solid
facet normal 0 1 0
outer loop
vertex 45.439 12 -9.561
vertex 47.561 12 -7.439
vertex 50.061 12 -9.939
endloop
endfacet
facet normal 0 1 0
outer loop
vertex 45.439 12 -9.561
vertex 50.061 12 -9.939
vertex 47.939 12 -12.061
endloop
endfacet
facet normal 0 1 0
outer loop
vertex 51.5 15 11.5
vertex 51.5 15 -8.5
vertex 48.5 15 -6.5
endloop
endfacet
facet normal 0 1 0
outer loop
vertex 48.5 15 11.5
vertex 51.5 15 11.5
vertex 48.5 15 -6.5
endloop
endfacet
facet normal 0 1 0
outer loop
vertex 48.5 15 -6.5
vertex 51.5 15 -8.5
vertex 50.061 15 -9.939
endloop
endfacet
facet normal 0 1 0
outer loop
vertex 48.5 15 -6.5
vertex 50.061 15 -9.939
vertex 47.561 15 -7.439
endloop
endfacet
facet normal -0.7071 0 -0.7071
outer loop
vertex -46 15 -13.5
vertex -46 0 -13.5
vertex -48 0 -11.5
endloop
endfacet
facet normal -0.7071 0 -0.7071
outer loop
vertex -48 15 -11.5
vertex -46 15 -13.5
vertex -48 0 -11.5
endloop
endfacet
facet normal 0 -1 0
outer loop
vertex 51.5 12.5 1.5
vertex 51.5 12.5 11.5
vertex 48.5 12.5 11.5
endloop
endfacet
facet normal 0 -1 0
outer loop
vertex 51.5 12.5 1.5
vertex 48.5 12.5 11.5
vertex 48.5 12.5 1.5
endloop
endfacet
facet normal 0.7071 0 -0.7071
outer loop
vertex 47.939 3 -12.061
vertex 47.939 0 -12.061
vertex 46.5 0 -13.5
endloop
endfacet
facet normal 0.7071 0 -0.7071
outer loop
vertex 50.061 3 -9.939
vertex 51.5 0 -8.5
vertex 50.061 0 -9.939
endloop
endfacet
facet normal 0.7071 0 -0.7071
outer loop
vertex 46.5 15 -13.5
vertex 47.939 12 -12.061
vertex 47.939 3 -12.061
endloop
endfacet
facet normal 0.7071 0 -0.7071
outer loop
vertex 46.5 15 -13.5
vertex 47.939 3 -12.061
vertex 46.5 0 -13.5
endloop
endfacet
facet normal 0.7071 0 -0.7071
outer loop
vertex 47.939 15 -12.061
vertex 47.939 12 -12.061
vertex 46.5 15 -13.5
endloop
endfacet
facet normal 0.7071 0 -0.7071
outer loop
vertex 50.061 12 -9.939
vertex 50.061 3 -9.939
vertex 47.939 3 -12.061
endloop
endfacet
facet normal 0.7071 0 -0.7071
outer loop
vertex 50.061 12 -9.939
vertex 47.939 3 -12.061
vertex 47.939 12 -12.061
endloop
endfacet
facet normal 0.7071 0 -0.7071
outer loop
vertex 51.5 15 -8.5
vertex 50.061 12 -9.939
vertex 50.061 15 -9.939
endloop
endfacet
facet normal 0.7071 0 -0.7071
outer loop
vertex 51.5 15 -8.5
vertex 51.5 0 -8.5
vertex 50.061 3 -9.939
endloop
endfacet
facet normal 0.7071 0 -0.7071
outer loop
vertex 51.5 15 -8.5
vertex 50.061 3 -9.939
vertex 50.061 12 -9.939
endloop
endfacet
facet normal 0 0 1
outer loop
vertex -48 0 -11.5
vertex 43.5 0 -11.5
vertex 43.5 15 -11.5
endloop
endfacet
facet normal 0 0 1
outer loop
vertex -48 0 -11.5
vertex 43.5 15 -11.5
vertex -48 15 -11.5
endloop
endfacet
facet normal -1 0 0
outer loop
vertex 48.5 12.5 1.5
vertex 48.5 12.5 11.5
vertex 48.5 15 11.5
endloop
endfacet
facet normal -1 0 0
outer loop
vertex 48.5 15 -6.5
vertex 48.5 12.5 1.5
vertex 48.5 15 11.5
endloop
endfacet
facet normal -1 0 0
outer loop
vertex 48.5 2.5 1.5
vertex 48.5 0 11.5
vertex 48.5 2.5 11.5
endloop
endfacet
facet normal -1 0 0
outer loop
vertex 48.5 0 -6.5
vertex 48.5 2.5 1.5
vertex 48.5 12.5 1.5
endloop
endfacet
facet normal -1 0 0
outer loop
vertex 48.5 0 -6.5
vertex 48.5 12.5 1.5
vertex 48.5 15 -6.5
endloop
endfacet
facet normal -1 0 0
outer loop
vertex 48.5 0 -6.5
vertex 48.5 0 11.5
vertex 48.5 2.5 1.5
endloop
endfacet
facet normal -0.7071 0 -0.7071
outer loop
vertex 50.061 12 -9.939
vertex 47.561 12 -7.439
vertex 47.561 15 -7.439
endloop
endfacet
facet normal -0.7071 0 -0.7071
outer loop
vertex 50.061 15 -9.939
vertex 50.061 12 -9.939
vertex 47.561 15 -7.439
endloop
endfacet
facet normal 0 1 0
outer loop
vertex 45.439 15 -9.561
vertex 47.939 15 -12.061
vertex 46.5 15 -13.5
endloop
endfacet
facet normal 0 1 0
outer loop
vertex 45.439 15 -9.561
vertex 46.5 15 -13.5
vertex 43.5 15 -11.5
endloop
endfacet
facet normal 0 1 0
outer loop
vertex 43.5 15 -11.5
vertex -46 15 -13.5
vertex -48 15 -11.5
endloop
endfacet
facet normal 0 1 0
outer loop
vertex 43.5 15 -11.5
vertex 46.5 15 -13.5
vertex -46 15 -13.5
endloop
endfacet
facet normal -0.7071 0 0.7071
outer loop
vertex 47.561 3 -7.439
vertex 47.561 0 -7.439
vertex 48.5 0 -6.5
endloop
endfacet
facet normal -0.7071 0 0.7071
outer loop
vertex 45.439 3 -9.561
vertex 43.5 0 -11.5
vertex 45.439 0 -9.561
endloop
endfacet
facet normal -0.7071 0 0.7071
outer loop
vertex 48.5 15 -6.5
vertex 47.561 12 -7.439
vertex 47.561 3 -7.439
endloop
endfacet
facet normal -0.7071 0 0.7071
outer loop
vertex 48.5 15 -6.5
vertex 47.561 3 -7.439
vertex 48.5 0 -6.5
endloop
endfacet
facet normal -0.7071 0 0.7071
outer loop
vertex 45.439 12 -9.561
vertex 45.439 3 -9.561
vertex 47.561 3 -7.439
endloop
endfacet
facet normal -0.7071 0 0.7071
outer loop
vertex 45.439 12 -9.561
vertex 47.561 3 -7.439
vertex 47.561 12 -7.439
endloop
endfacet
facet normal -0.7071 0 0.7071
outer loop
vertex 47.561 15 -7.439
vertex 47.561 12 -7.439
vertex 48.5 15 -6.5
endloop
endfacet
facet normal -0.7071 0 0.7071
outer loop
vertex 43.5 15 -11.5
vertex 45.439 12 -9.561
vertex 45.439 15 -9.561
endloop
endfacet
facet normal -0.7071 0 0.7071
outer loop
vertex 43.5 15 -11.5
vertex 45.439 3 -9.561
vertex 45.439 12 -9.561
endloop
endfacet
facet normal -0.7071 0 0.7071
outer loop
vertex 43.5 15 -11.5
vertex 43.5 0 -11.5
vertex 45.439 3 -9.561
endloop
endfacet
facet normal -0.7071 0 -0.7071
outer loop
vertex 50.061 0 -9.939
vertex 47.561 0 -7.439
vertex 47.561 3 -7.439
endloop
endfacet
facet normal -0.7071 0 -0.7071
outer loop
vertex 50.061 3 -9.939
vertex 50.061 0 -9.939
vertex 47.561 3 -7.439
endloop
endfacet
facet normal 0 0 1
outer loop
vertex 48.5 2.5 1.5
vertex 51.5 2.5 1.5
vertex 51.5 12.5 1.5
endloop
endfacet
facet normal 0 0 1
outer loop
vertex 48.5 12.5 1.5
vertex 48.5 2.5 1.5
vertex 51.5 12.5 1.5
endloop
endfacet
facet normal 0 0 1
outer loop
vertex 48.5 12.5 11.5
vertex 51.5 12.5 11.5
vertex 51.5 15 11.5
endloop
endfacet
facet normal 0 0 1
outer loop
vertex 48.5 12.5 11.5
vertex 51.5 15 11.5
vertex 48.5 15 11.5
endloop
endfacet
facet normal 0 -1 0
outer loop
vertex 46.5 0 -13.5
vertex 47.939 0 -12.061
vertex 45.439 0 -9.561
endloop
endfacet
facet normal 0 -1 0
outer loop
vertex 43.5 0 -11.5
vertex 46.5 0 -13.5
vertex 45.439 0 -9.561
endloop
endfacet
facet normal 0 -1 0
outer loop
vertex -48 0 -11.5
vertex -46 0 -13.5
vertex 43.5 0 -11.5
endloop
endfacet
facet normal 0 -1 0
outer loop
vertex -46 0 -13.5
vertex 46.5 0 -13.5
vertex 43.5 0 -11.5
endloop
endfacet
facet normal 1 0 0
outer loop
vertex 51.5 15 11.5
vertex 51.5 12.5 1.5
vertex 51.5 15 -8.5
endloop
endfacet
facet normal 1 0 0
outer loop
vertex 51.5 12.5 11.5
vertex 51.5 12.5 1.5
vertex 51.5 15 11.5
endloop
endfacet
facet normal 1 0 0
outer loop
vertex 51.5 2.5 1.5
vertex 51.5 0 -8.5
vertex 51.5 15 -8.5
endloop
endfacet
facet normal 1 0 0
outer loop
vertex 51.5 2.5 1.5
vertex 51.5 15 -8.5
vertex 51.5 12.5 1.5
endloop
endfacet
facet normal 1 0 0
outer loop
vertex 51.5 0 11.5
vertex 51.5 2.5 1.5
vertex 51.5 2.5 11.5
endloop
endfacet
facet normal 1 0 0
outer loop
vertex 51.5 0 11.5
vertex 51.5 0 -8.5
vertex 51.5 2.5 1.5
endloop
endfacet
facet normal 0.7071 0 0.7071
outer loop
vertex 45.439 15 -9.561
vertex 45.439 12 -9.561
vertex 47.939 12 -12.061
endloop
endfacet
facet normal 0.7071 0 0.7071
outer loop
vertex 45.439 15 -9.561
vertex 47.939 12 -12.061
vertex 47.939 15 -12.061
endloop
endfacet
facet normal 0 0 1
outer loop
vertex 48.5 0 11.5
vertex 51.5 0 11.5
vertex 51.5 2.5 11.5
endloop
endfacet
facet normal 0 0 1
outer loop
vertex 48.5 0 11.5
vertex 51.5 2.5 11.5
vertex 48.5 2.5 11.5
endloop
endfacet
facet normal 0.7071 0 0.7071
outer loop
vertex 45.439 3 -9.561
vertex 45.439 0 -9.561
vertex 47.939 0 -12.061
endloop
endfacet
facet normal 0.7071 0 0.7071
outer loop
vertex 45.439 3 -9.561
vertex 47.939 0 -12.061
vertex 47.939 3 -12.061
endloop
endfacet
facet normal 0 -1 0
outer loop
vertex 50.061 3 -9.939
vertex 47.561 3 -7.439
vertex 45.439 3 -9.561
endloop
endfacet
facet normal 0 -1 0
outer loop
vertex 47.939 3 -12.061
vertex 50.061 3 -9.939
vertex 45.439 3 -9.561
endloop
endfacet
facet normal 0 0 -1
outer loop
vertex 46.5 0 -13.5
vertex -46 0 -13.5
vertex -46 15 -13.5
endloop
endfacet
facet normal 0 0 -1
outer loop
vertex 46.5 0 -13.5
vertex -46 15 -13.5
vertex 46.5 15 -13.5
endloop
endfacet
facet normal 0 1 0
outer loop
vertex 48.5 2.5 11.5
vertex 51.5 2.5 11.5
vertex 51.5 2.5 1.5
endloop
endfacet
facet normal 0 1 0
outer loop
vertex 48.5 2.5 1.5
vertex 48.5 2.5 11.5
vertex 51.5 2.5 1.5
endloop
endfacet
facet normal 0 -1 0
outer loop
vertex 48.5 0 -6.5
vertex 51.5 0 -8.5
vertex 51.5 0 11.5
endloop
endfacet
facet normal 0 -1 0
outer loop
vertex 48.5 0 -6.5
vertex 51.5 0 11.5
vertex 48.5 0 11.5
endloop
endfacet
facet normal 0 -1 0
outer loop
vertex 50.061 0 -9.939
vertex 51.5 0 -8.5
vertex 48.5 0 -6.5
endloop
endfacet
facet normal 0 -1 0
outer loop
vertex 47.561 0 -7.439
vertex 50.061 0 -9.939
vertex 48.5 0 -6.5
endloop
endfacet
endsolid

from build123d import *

# Parameters (mm, degrees)
BOSS_EXTRUDE1_DEPTH = 15
CHAMFER1_SIZE       = 5
SKETCH3_W           = 10
SKETCH3_H           = 10
CUT_EXTRUDE1_DEPTH  = 24
CHAMFER2_SIZE       = 2.5
SKETCH4_W           = 3
SKETCH4_H           = 3
CUT_EXTRUDE2_DEPTH  = 3.535533906


with BuildPart() as part:
    # Sketch1 → Boss-Extrude1 (new body)
    with BuildSketch(Plane(origin=(0, 0, 0), x_dir=(1, 0, 0), z_dir=(0, 1, 0))):
        Polygon((-48.5, 13.5), (51.5, 13.5), (51.5, -11.5), (48.5, -11.5), (48.5, 11.5), (-48.5, 11.5), align=None)
    extrude(amount=BOSS_EXTRUDE1_DEPTH)

    # Chamfer1
    chamfer1_edges = [part.edges().sort_by_distance(p)[0] for p in [
        (51.5, 7.5, -13.5),
        (48.5, 7.5, -11.5),
    ]]
    chamfer(chamfer1_edges, length=CHAMFER1_SIZE)

    # Sketch3 → Cut-Extrude1 (cut)
    with BuildSketch(Plane(origin=(51.5, 0, 0), x_dir=(0, 0, -1), z_dir=(1, 0, 0))):
        with Locations((-6.5, 7.5)):
            Rectangle(SKETCH3_W, SKETCH3_H)
    extrude(amount=-CUT_EXTRUDE1_DEPTH, mode=Mode.SUBTRACT)

    # Chamfer2
    # the kernel refuses this chamfer: 2.5 mm, written as the material it takes off along each edge
    with BuildSketch(Plane(origin=(-48.5, -6.42920747, -13.5), x_dir=(0.9996219169112968, 0, -0.027495876610586282), z_dir=(0, 1, 0))) as chamfer2_piece_1:
        Polygon((CHAMFER2_SIZE * 0.999621916911, -CHAMFER2_SIZE * 0.0274958766106), (-CHAMFER2_SIZE * 0.0274958766106, -CHAMFER2_SIZE * 0.999621916911), (0, 0), align=None)
    extrude(amount=27.85841494, mode=Mode.SUBTRACT)

    # Sketch4 → Cut-Extrude2 (cut)
    with BuildSketch(Plane(origin=(30, 0, -30), x_dir=(-0.7071067811865442, 0, -0.7071067811865509), z_dir=(0.7071067811865509, 0, -0.7071067811865442))):
        with Locations((-26.870057685, 1.5)):
            Rectangle(SKETCH4_W, SKETCH4_H)
        with Locations((-26.870057685, 13.5)):
            Rectangle(SKETCH4_W, SKETCH4_H)
    extrude(amount=-CUT_EXTRUDE2_DEPTH, mode=Mode.SUBTRACT)


solid = part.part
